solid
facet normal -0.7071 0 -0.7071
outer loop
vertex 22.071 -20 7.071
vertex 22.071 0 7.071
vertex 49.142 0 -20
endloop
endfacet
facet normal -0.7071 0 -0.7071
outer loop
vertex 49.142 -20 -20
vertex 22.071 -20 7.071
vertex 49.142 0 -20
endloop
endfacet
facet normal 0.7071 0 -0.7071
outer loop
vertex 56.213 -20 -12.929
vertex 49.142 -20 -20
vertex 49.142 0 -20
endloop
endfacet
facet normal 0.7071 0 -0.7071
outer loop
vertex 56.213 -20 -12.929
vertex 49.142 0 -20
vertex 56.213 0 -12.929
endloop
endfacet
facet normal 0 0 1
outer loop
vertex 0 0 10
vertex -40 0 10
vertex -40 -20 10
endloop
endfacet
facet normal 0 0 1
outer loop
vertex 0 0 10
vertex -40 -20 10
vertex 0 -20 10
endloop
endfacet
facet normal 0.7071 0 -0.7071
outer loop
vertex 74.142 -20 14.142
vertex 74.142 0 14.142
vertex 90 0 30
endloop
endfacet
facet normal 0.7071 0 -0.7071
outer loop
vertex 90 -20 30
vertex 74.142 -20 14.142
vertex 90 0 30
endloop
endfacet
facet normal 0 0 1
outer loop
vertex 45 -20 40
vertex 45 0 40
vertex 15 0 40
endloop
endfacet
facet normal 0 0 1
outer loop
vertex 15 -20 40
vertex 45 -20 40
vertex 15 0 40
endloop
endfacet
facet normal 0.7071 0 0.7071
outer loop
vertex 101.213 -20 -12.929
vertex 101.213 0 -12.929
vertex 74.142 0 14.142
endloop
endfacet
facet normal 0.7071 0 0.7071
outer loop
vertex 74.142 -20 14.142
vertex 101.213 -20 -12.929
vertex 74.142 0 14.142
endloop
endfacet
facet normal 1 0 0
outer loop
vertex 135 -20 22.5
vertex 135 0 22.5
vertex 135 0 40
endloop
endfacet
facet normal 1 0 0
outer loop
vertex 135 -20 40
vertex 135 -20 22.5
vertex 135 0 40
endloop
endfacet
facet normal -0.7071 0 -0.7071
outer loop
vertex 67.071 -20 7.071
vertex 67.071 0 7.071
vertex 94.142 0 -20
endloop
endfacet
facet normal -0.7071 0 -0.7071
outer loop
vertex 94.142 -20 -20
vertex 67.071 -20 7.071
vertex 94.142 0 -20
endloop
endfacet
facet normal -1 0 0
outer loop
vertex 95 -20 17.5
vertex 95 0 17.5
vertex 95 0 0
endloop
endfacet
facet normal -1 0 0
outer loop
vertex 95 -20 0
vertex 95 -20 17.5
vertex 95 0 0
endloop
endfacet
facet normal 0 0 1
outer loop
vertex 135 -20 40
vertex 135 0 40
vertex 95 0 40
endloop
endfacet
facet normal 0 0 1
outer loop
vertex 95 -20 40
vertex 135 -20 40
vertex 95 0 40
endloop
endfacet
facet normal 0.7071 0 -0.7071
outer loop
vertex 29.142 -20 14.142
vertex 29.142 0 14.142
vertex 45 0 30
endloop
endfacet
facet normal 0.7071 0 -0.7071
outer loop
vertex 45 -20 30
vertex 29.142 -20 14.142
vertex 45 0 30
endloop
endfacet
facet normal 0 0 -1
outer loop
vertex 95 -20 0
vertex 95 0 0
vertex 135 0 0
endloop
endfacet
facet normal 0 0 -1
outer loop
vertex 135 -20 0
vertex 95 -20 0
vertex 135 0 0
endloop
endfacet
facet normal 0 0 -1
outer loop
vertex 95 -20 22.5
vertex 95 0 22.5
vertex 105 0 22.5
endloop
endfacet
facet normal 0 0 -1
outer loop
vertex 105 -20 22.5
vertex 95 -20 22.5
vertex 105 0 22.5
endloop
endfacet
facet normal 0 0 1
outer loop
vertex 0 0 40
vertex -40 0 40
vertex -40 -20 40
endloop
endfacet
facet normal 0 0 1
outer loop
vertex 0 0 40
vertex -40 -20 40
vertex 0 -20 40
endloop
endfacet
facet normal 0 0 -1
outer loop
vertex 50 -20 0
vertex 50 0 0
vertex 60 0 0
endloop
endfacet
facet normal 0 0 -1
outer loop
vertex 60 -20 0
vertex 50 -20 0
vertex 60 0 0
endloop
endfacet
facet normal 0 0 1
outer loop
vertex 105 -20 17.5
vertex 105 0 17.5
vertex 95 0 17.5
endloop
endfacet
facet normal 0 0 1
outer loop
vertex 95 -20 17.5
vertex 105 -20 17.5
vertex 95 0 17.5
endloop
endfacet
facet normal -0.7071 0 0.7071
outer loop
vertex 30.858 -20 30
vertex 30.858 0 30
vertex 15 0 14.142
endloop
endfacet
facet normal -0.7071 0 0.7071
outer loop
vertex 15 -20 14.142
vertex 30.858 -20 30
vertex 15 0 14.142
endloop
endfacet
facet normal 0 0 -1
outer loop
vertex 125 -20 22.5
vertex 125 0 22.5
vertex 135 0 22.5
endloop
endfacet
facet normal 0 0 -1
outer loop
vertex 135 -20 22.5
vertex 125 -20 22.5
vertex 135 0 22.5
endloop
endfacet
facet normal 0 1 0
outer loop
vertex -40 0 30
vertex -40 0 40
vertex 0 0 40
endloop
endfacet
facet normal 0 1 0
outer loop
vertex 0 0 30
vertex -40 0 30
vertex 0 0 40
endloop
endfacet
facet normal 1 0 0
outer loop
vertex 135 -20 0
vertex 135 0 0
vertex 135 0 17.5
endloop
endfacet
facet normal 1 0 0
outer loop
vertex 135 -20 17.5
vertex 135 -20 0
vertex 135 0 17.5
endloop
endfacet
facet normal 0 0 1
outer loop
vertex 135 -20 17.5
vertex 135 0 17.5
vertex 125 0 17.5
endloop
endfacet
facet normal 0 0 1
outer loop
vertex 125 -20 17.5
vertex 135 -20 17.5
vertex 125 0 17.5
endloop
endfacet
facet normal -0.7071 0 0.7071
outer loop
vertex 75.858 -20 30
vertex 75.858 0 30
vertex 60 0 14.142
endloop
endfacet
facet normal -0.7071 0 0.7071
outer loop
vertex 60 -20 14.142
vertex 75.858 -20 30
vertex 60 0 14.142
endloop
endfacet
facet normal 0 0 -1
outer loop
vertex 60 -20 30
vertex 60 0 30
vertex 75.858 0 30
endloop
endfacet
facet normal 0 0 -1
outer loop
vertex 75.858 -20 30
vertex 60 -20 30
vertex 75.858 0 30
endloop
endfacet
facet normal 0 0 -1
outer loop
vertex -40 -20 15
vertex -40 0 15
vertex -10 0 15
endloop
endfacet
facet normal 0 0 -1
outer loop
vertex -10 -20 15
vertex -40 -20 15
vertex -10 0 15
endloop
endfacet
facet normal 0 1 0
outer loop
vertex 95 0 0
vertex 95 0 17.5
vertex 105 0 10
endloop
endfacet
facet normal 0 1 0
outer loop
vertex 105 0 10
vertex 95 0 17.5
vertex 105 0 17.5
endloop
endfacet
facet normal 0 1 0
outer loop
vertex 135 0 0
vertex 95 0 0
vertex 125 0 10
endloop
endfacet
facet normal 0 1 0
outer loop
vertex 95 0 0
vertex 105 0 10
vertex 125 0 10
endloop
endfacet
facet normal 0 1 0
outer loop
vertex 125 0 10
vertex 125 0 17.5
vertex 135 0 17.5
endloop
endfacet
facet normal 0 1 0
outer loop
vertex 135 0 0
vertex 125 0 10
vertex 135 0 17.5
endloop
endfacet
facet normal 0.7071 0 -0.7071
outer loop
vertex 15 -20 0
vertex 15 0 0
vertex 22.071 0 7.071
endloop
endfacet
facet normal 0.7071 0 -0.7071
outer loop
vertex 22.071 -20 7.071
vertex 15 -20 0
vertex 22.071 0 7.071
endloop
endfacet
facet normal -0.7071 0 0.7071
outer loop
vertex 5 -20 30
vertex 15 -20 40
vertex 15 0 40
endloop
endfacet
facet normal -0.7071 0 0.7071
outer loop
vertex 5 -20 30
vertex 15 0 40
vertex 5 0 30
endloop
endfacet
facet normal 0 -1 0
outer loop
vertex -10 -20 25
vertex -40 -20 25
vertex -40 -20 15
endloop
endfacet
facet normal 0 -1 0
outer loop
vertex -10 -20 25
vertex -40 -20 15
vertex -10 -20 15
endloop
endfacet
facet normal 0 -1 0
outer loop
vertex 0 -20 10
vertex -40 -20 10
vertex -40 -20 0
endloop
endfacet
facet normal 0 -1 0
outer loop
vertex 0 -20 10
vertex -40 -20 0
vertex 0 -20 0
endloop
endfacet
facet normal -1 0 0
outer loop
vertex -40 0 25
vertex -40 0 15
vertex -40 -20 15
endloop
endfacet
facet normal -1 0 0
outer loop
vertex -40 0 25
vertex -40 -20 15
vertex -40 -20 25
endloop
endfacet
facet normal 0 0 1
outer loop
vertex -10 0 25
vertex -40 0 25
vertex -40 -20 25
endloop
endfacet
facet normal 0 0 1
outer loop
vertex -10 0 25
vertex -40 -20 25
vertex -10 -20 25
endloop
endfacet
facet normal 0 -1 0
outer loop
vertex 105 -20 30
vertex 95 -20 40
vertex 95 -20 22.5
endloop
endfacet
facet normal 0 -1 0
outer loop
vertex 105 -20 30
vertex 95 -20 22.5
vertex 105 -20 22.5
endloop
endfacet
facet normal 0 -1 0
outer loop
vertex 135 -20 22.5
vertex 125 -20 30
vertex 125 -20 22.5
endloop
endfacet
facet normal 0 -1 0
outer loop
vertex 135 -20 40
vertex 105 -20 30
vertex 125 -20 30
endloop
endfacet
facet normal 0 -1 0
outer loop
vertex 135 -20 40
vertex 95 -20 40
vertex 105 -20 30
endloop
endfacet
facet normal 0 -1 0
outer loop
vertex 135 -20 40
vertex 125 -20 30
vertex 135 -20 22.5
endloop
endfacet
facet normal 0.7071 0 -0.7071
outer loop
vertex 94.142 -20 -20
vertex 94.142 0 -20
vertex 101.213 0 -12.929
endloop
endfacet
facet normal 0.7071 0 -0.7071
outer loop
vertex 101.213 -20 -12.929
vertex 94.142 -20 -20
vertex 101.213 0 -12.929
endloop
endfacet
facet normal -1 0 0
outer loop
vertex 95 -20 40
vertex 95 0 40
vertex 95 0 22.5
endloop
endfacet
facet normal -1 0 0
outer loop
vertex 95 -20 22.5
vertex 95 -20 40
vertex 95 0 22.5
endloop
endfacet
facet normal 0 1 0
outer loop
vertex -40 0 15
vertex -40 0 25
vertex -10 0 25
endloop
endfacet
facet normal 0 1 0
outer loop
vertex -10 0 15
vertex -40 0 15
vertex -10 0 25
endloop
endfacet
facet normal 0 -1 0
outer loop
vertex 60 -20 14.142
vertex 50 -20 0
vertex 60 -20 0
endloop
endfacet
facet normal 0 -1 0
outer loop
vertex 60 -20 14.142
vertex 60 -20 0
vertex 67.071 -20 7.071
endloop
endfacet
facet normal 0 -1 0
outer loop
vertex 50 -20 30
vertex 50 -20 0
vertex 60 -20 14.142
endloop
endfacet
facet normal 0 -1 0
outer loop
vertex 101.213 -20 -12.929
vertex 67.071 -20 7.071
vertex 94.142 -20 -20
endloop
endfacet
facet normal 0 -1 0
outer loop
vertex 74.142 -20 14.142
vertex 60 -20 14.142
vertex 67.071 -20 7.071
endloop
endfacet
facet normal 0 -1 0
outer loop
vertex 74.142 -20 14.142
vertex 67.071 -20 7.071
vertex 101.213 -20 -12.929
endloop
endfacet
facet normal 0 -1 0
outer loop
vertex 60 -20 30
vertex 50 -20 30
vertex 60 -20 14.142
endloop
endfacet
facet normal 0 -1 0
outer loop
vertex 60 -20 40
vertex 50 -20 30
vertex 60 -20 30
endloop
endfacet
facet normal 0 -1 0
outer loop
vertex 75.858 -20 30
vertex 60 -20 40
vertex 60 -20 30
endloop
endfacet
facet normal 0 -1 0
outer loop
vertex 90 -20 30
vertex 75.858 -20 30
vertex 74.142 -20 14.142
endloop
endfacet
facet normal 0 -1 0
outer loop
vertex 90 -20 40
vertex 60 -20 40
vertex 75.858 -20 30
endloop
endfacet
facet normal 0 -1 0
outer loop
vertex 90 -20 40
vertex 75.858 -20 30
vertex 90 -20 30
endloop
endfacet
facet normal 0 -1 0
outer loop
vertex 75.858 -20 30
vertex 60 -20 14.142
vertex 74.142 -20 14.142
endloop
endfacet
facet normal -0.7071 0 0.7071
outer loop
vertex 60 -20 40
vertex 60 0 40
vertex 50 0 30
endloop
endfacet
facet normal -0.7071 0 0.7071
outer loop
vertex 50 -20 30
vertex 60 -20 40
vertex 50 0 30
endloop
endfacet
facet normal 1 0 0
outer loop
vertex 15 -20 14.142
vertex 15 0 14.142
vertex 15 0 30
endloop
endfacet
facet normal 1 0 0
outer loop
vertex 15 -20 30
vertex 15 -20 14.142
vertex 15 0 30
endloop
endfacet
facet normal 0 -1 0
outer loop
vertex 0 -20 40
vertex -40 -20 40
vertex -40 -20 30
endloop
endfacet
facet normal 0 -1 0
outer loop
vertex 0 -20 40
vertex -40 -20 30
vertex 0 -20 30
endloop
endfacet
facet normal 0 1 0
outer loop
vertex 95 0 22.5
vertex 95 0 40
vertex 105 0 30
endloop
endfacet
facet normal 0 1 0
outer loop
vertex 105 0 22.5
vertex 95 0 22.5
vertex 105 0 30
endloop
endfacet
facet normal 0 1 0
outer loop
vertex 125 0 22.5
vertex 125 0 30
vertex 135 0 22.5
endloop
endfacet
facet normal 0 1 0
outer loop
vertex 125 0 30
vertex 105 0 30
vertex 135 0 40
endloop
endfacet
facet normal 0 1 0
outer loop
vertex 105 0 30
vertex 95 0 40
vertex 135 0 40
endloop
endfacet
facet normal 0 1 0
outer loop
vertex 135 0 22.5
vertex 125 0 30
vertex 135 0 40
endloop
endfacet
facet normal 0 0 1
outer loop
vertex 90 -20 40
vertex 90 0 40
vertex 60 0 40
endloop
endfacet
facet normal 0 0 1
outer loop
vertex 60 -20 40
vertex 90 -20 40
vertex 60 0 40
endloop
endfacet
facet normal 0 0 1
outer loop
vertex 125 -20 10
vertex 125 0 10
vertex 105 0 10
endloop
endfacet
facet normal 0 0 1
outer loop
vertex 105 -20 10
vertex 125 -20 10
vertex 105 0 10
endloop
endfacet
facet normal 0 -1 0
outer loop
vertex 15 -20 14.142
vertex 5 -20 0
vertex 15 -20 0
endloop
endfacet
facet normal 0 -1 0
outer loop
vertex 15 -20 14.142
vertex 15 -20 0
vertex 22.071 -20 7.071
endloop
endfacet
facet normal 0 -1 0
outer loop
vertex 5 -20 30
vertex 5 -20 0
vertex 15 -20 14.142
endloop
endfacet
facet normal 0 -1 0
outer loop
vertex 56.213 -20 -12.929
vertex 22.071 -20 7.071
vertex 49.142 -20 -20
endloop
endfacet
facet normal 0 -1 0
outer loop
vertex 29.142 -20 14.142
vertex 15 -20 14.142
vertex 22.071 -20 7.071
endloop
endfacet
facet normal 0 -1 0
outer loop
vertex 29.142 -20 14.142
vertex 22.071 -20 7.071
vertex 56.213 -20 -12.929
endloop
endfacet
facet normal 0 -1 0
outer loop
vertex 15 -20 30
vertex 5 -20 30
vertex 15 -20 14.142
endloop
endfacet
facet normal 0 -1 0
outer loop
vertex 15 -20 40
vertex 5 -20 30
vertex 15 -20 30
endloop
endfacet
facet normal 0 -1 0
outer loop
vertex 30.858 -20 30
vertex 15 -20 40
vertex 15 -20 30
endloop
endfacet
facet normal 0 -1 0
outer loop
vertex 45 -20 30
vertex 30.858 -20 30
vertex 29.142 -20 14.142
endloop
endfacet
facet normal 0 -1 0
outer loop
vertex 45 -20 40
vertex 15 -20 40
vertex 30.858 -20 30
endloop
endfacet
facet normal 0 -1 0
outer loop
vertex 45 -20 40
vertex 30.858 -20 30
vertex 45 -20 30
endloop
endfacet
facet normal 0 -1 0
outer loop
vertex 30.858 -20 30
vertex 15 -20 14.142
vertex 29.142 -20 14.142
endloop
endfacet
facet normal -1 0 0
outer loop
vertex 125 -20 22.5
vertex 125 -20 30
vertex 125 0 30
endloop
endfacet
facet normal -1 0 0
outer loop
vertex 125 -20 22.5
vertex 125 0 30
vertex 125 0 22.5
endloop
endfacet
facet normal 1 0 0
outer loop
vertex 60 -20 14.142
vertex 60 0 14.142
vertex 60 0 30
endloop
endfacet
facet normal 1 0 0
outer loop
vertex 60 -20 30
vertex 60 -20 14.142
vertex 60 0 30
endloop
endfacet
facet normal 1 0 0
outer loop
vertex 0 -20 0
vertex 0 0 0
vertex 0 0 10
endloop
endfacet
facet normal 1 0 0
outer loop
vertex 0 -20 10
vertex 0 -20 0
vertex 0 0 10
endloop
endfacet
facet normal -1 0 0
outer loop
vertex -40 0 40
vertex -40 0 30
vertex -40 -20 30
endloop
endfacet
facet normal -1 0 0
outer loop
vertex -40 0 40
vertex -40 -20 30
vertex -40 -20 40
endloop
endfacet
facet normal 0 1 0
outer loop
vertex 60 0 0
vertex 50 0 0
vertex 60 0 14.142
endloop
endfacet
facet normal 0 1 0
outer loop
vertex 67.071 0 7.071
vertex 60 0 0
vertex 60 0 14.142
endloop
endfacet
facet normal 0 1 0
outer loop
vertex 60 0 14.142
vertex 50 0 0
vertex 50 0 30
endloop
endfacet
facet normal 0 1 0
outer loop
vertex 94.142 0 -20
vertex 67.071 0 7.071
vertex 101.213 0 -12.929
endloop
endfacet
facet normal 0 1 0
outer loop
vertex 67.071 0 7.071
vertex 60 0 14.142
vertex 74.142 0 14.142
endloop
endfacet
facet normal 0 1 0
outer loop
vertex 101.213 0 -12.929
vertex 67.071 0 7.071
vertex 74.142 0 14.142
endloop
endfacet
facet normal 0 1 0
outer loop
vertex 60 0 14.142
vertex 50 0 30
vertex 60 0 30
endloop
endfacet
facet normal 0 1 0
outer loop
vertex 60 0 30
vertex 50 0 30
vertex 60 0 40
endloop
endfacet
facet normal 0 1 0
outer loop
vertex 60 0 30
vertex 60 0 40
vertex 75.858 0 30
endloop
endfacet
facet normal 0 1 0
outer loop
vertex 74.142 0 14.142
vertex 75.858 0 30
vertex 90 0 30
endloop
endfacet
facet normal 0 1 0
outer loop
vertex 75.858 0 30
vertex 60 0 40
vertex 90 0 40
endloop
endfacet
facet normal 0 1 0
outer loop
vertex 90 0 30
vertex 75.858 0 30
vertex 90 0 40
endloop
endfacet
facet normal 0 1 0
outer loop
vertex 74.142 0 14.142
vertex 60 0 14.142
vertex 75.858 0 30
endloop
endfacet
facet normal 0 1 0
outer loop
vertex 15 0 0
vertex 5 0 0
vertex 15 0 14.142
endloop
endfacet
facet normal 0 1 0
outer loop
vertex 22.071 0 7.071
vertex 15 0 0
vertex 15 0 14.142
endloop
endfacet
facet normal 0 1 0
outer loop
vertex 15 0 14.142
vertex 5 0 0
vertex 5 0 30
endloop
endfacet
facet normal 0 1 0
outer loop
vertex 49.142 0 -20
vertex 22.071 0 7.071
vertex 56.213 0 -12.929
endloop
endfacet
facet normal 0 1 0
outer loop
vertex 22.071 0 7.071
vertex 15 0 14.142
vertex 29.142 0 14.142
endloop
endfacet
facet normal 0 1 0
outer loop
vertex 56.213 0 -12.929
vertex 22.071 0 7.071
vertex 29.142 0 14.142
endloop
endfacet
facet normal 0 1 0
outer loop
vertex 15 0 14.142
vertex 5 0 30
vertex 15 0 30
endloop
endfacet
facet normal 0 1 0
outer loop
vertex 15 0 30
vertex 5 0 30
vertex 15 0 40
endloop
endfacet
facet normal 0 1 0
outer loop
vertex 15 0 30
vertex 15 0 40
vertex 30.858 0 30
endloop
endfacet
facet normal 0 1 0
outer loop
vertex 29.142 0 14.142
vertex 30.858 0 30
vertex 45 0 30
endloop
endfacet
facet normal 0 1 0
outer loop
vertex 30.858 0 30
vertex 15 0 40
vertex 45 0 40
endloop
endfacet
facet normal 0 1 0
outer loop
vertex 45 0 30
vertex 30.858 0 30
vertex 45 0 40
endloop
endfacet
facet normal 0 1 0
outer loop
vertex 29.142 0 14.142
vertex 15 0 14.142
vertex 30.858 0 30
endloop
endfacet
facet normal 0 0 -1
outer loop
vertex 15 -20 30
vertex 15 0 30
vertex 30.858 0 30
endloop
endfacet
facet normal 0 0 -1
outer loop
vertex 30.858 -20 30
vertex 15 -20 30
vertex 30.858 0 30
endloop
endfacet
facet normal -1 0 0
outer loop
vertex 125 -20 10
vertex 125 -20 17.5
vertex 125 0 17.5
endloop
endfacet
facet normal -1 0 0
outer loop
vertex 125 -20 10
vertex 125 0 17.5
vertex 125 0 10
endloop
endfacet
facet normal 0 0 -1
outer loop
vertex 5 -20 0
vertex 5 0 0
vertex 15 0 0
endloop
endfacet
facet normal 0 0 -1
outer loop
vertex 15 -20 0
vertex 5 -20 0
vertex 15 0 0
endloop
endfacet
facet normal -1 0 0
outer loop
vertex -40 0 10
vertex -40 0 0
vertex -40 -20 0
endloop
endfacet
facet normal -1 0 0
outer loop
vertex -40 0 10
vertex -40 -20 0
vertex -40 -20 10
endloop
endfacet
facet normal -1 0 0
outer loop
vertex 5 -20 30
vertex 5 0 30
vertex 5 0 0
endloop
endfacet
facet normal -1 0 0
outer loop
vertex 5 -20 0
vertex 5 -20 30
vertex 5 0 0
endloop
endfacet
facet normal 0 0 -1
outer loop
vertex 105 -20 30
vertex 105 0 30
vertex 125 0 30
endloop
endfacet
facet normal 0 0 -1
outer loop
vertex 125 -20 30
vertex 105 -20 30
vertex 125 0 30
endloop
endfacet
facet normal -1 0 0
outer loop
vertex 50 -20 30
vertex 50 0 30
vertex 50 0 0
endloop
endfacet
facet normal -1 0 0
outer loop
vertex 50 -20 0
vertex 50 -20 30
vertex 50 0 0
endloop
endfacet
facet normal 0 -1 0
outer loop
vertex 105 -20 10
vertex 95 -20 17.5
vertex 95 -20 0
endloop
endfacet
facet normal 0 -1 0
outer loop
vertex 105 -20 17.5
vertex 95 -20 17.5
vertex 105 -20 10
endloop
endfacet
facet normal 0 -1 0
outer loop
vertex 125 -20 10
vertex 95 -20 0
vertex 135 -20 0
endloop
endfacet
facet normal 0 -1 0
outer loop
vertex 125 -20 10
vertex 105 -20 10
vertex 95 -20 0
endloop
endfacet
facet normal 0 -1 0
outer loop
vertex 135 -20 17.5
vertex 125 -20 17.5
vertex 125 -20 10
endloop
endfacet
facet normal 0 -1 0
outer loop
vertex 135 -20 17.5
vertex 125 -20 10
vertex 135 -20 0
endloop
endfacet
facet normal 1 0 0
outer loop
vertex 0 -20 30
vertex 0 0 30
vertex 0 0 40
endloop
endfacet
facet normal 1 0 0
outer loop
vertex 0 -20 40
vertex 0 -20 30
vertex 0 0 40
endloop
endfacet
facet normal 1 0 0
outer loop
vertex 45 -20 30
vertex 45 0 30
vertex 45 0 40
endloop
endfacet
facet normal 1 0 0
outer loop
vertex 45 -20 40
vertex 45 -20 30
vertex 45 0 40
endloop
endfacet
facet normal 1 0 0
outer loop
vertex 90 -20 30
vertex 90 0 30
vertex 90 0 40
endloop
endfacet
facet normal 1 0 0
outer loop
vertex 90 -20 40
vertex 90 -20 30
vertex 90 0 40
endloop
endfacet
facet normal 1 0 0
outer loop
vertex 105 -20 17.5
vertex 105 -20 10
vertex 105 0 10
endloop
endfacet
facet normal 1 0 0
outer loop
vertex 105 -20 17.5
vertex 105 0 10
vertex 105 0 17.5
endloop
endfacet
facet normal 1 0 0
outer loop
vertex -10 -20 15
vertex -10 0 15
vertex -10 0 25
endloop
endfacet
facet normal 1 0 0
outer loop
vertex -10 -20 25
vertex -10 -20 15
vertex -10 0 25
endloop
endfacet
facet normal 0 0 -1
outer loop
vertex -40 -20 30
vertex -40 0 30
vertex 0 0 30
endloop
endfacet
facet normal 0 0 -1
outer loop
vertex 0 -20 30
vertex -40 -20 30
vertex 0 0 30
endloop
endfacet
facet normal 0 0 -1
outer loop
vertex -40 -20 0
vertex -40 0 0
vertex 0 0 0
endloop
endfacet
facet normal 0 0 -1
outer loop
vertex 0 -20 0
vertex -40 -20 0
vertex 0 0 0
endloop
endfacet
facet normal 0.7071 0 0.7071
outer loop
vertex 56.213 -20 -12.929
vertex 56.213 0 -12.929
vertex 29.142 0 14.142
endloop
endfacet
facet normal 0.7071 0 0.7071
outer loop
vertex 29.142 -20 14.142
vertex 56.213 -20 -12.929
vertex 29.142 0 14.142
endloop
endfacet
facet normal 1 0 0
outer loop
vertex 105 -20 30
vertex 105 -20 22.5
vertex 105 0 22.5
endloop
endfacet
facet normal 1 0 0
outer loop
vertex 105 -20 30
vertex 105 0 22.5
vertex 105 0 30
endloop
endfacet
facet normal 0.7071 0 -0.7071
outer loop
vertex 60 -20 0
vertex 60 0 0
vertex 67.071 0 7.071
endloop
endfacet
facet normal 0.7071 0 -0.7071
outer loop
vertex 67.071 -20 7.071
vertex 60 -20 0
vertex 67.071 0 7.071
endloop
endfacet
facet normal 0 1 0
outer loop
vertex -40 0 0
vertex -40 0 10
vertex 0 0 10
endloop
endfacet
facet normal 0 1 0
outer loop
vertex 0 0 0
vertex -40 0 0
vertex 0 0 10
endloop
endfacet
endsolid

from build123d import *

# Parameters (mm, degrees)
F0_W     = 40
F0_H     = 10
F0_W_2   = 30
F1_DEPTH = 20


with BuildPart() as f1:
    # F0 (on Front) → F1 (new body)
    with BuildSketch(Plane.XZ):
        with Locations((-20, 35)):
            Rectangle(F0_W, F0_H)
        with Locations((-25, 20)):
            Rectangle(F0_W_2, F0_H)
        with Locations((-20, 5)):
            Rectangle(F0_W, F0_H)
        Polygon((5, 30), (5, 0), (15, 0), (22.071068, 7.071068), (49.142136, -20), (56.213203, -12.928932), (29.142136, 14.142136), (45, 30), (45, 40), (15, 40), align=None)
        Polygon((15, 14.142136), (15, 30), (30.857864, 30), align=None, mode=Mode.SUBTRACT)
        Polygon((50, 30), (50, 0), (60, 0), (67.071068, 7.071068), (94.142136, -20), (101.213203, -12.928932), (74.142136, 14.142136), (90, 30), (90, 40), (60, 40), align=None)
        Polygon((60, 14.142136), (60, 30), (75.857864, 30), align=None, mode=Mode.SUBTRACT)
        Polygon((95, 17.5), (95, 0), (135, 0), (135, 17.5), (125, 17.5), (125, 10), (105, 10), (105, 17.5), align=None)
        Polygon((135, 40), (95, 40), (95, 22.5), (105, 22.5), (105, 30), (125, 30), (125, 22.5), (135, 22.5), align=None)
    extrude(amount=F1_DEPTH)


solid = f1.part
